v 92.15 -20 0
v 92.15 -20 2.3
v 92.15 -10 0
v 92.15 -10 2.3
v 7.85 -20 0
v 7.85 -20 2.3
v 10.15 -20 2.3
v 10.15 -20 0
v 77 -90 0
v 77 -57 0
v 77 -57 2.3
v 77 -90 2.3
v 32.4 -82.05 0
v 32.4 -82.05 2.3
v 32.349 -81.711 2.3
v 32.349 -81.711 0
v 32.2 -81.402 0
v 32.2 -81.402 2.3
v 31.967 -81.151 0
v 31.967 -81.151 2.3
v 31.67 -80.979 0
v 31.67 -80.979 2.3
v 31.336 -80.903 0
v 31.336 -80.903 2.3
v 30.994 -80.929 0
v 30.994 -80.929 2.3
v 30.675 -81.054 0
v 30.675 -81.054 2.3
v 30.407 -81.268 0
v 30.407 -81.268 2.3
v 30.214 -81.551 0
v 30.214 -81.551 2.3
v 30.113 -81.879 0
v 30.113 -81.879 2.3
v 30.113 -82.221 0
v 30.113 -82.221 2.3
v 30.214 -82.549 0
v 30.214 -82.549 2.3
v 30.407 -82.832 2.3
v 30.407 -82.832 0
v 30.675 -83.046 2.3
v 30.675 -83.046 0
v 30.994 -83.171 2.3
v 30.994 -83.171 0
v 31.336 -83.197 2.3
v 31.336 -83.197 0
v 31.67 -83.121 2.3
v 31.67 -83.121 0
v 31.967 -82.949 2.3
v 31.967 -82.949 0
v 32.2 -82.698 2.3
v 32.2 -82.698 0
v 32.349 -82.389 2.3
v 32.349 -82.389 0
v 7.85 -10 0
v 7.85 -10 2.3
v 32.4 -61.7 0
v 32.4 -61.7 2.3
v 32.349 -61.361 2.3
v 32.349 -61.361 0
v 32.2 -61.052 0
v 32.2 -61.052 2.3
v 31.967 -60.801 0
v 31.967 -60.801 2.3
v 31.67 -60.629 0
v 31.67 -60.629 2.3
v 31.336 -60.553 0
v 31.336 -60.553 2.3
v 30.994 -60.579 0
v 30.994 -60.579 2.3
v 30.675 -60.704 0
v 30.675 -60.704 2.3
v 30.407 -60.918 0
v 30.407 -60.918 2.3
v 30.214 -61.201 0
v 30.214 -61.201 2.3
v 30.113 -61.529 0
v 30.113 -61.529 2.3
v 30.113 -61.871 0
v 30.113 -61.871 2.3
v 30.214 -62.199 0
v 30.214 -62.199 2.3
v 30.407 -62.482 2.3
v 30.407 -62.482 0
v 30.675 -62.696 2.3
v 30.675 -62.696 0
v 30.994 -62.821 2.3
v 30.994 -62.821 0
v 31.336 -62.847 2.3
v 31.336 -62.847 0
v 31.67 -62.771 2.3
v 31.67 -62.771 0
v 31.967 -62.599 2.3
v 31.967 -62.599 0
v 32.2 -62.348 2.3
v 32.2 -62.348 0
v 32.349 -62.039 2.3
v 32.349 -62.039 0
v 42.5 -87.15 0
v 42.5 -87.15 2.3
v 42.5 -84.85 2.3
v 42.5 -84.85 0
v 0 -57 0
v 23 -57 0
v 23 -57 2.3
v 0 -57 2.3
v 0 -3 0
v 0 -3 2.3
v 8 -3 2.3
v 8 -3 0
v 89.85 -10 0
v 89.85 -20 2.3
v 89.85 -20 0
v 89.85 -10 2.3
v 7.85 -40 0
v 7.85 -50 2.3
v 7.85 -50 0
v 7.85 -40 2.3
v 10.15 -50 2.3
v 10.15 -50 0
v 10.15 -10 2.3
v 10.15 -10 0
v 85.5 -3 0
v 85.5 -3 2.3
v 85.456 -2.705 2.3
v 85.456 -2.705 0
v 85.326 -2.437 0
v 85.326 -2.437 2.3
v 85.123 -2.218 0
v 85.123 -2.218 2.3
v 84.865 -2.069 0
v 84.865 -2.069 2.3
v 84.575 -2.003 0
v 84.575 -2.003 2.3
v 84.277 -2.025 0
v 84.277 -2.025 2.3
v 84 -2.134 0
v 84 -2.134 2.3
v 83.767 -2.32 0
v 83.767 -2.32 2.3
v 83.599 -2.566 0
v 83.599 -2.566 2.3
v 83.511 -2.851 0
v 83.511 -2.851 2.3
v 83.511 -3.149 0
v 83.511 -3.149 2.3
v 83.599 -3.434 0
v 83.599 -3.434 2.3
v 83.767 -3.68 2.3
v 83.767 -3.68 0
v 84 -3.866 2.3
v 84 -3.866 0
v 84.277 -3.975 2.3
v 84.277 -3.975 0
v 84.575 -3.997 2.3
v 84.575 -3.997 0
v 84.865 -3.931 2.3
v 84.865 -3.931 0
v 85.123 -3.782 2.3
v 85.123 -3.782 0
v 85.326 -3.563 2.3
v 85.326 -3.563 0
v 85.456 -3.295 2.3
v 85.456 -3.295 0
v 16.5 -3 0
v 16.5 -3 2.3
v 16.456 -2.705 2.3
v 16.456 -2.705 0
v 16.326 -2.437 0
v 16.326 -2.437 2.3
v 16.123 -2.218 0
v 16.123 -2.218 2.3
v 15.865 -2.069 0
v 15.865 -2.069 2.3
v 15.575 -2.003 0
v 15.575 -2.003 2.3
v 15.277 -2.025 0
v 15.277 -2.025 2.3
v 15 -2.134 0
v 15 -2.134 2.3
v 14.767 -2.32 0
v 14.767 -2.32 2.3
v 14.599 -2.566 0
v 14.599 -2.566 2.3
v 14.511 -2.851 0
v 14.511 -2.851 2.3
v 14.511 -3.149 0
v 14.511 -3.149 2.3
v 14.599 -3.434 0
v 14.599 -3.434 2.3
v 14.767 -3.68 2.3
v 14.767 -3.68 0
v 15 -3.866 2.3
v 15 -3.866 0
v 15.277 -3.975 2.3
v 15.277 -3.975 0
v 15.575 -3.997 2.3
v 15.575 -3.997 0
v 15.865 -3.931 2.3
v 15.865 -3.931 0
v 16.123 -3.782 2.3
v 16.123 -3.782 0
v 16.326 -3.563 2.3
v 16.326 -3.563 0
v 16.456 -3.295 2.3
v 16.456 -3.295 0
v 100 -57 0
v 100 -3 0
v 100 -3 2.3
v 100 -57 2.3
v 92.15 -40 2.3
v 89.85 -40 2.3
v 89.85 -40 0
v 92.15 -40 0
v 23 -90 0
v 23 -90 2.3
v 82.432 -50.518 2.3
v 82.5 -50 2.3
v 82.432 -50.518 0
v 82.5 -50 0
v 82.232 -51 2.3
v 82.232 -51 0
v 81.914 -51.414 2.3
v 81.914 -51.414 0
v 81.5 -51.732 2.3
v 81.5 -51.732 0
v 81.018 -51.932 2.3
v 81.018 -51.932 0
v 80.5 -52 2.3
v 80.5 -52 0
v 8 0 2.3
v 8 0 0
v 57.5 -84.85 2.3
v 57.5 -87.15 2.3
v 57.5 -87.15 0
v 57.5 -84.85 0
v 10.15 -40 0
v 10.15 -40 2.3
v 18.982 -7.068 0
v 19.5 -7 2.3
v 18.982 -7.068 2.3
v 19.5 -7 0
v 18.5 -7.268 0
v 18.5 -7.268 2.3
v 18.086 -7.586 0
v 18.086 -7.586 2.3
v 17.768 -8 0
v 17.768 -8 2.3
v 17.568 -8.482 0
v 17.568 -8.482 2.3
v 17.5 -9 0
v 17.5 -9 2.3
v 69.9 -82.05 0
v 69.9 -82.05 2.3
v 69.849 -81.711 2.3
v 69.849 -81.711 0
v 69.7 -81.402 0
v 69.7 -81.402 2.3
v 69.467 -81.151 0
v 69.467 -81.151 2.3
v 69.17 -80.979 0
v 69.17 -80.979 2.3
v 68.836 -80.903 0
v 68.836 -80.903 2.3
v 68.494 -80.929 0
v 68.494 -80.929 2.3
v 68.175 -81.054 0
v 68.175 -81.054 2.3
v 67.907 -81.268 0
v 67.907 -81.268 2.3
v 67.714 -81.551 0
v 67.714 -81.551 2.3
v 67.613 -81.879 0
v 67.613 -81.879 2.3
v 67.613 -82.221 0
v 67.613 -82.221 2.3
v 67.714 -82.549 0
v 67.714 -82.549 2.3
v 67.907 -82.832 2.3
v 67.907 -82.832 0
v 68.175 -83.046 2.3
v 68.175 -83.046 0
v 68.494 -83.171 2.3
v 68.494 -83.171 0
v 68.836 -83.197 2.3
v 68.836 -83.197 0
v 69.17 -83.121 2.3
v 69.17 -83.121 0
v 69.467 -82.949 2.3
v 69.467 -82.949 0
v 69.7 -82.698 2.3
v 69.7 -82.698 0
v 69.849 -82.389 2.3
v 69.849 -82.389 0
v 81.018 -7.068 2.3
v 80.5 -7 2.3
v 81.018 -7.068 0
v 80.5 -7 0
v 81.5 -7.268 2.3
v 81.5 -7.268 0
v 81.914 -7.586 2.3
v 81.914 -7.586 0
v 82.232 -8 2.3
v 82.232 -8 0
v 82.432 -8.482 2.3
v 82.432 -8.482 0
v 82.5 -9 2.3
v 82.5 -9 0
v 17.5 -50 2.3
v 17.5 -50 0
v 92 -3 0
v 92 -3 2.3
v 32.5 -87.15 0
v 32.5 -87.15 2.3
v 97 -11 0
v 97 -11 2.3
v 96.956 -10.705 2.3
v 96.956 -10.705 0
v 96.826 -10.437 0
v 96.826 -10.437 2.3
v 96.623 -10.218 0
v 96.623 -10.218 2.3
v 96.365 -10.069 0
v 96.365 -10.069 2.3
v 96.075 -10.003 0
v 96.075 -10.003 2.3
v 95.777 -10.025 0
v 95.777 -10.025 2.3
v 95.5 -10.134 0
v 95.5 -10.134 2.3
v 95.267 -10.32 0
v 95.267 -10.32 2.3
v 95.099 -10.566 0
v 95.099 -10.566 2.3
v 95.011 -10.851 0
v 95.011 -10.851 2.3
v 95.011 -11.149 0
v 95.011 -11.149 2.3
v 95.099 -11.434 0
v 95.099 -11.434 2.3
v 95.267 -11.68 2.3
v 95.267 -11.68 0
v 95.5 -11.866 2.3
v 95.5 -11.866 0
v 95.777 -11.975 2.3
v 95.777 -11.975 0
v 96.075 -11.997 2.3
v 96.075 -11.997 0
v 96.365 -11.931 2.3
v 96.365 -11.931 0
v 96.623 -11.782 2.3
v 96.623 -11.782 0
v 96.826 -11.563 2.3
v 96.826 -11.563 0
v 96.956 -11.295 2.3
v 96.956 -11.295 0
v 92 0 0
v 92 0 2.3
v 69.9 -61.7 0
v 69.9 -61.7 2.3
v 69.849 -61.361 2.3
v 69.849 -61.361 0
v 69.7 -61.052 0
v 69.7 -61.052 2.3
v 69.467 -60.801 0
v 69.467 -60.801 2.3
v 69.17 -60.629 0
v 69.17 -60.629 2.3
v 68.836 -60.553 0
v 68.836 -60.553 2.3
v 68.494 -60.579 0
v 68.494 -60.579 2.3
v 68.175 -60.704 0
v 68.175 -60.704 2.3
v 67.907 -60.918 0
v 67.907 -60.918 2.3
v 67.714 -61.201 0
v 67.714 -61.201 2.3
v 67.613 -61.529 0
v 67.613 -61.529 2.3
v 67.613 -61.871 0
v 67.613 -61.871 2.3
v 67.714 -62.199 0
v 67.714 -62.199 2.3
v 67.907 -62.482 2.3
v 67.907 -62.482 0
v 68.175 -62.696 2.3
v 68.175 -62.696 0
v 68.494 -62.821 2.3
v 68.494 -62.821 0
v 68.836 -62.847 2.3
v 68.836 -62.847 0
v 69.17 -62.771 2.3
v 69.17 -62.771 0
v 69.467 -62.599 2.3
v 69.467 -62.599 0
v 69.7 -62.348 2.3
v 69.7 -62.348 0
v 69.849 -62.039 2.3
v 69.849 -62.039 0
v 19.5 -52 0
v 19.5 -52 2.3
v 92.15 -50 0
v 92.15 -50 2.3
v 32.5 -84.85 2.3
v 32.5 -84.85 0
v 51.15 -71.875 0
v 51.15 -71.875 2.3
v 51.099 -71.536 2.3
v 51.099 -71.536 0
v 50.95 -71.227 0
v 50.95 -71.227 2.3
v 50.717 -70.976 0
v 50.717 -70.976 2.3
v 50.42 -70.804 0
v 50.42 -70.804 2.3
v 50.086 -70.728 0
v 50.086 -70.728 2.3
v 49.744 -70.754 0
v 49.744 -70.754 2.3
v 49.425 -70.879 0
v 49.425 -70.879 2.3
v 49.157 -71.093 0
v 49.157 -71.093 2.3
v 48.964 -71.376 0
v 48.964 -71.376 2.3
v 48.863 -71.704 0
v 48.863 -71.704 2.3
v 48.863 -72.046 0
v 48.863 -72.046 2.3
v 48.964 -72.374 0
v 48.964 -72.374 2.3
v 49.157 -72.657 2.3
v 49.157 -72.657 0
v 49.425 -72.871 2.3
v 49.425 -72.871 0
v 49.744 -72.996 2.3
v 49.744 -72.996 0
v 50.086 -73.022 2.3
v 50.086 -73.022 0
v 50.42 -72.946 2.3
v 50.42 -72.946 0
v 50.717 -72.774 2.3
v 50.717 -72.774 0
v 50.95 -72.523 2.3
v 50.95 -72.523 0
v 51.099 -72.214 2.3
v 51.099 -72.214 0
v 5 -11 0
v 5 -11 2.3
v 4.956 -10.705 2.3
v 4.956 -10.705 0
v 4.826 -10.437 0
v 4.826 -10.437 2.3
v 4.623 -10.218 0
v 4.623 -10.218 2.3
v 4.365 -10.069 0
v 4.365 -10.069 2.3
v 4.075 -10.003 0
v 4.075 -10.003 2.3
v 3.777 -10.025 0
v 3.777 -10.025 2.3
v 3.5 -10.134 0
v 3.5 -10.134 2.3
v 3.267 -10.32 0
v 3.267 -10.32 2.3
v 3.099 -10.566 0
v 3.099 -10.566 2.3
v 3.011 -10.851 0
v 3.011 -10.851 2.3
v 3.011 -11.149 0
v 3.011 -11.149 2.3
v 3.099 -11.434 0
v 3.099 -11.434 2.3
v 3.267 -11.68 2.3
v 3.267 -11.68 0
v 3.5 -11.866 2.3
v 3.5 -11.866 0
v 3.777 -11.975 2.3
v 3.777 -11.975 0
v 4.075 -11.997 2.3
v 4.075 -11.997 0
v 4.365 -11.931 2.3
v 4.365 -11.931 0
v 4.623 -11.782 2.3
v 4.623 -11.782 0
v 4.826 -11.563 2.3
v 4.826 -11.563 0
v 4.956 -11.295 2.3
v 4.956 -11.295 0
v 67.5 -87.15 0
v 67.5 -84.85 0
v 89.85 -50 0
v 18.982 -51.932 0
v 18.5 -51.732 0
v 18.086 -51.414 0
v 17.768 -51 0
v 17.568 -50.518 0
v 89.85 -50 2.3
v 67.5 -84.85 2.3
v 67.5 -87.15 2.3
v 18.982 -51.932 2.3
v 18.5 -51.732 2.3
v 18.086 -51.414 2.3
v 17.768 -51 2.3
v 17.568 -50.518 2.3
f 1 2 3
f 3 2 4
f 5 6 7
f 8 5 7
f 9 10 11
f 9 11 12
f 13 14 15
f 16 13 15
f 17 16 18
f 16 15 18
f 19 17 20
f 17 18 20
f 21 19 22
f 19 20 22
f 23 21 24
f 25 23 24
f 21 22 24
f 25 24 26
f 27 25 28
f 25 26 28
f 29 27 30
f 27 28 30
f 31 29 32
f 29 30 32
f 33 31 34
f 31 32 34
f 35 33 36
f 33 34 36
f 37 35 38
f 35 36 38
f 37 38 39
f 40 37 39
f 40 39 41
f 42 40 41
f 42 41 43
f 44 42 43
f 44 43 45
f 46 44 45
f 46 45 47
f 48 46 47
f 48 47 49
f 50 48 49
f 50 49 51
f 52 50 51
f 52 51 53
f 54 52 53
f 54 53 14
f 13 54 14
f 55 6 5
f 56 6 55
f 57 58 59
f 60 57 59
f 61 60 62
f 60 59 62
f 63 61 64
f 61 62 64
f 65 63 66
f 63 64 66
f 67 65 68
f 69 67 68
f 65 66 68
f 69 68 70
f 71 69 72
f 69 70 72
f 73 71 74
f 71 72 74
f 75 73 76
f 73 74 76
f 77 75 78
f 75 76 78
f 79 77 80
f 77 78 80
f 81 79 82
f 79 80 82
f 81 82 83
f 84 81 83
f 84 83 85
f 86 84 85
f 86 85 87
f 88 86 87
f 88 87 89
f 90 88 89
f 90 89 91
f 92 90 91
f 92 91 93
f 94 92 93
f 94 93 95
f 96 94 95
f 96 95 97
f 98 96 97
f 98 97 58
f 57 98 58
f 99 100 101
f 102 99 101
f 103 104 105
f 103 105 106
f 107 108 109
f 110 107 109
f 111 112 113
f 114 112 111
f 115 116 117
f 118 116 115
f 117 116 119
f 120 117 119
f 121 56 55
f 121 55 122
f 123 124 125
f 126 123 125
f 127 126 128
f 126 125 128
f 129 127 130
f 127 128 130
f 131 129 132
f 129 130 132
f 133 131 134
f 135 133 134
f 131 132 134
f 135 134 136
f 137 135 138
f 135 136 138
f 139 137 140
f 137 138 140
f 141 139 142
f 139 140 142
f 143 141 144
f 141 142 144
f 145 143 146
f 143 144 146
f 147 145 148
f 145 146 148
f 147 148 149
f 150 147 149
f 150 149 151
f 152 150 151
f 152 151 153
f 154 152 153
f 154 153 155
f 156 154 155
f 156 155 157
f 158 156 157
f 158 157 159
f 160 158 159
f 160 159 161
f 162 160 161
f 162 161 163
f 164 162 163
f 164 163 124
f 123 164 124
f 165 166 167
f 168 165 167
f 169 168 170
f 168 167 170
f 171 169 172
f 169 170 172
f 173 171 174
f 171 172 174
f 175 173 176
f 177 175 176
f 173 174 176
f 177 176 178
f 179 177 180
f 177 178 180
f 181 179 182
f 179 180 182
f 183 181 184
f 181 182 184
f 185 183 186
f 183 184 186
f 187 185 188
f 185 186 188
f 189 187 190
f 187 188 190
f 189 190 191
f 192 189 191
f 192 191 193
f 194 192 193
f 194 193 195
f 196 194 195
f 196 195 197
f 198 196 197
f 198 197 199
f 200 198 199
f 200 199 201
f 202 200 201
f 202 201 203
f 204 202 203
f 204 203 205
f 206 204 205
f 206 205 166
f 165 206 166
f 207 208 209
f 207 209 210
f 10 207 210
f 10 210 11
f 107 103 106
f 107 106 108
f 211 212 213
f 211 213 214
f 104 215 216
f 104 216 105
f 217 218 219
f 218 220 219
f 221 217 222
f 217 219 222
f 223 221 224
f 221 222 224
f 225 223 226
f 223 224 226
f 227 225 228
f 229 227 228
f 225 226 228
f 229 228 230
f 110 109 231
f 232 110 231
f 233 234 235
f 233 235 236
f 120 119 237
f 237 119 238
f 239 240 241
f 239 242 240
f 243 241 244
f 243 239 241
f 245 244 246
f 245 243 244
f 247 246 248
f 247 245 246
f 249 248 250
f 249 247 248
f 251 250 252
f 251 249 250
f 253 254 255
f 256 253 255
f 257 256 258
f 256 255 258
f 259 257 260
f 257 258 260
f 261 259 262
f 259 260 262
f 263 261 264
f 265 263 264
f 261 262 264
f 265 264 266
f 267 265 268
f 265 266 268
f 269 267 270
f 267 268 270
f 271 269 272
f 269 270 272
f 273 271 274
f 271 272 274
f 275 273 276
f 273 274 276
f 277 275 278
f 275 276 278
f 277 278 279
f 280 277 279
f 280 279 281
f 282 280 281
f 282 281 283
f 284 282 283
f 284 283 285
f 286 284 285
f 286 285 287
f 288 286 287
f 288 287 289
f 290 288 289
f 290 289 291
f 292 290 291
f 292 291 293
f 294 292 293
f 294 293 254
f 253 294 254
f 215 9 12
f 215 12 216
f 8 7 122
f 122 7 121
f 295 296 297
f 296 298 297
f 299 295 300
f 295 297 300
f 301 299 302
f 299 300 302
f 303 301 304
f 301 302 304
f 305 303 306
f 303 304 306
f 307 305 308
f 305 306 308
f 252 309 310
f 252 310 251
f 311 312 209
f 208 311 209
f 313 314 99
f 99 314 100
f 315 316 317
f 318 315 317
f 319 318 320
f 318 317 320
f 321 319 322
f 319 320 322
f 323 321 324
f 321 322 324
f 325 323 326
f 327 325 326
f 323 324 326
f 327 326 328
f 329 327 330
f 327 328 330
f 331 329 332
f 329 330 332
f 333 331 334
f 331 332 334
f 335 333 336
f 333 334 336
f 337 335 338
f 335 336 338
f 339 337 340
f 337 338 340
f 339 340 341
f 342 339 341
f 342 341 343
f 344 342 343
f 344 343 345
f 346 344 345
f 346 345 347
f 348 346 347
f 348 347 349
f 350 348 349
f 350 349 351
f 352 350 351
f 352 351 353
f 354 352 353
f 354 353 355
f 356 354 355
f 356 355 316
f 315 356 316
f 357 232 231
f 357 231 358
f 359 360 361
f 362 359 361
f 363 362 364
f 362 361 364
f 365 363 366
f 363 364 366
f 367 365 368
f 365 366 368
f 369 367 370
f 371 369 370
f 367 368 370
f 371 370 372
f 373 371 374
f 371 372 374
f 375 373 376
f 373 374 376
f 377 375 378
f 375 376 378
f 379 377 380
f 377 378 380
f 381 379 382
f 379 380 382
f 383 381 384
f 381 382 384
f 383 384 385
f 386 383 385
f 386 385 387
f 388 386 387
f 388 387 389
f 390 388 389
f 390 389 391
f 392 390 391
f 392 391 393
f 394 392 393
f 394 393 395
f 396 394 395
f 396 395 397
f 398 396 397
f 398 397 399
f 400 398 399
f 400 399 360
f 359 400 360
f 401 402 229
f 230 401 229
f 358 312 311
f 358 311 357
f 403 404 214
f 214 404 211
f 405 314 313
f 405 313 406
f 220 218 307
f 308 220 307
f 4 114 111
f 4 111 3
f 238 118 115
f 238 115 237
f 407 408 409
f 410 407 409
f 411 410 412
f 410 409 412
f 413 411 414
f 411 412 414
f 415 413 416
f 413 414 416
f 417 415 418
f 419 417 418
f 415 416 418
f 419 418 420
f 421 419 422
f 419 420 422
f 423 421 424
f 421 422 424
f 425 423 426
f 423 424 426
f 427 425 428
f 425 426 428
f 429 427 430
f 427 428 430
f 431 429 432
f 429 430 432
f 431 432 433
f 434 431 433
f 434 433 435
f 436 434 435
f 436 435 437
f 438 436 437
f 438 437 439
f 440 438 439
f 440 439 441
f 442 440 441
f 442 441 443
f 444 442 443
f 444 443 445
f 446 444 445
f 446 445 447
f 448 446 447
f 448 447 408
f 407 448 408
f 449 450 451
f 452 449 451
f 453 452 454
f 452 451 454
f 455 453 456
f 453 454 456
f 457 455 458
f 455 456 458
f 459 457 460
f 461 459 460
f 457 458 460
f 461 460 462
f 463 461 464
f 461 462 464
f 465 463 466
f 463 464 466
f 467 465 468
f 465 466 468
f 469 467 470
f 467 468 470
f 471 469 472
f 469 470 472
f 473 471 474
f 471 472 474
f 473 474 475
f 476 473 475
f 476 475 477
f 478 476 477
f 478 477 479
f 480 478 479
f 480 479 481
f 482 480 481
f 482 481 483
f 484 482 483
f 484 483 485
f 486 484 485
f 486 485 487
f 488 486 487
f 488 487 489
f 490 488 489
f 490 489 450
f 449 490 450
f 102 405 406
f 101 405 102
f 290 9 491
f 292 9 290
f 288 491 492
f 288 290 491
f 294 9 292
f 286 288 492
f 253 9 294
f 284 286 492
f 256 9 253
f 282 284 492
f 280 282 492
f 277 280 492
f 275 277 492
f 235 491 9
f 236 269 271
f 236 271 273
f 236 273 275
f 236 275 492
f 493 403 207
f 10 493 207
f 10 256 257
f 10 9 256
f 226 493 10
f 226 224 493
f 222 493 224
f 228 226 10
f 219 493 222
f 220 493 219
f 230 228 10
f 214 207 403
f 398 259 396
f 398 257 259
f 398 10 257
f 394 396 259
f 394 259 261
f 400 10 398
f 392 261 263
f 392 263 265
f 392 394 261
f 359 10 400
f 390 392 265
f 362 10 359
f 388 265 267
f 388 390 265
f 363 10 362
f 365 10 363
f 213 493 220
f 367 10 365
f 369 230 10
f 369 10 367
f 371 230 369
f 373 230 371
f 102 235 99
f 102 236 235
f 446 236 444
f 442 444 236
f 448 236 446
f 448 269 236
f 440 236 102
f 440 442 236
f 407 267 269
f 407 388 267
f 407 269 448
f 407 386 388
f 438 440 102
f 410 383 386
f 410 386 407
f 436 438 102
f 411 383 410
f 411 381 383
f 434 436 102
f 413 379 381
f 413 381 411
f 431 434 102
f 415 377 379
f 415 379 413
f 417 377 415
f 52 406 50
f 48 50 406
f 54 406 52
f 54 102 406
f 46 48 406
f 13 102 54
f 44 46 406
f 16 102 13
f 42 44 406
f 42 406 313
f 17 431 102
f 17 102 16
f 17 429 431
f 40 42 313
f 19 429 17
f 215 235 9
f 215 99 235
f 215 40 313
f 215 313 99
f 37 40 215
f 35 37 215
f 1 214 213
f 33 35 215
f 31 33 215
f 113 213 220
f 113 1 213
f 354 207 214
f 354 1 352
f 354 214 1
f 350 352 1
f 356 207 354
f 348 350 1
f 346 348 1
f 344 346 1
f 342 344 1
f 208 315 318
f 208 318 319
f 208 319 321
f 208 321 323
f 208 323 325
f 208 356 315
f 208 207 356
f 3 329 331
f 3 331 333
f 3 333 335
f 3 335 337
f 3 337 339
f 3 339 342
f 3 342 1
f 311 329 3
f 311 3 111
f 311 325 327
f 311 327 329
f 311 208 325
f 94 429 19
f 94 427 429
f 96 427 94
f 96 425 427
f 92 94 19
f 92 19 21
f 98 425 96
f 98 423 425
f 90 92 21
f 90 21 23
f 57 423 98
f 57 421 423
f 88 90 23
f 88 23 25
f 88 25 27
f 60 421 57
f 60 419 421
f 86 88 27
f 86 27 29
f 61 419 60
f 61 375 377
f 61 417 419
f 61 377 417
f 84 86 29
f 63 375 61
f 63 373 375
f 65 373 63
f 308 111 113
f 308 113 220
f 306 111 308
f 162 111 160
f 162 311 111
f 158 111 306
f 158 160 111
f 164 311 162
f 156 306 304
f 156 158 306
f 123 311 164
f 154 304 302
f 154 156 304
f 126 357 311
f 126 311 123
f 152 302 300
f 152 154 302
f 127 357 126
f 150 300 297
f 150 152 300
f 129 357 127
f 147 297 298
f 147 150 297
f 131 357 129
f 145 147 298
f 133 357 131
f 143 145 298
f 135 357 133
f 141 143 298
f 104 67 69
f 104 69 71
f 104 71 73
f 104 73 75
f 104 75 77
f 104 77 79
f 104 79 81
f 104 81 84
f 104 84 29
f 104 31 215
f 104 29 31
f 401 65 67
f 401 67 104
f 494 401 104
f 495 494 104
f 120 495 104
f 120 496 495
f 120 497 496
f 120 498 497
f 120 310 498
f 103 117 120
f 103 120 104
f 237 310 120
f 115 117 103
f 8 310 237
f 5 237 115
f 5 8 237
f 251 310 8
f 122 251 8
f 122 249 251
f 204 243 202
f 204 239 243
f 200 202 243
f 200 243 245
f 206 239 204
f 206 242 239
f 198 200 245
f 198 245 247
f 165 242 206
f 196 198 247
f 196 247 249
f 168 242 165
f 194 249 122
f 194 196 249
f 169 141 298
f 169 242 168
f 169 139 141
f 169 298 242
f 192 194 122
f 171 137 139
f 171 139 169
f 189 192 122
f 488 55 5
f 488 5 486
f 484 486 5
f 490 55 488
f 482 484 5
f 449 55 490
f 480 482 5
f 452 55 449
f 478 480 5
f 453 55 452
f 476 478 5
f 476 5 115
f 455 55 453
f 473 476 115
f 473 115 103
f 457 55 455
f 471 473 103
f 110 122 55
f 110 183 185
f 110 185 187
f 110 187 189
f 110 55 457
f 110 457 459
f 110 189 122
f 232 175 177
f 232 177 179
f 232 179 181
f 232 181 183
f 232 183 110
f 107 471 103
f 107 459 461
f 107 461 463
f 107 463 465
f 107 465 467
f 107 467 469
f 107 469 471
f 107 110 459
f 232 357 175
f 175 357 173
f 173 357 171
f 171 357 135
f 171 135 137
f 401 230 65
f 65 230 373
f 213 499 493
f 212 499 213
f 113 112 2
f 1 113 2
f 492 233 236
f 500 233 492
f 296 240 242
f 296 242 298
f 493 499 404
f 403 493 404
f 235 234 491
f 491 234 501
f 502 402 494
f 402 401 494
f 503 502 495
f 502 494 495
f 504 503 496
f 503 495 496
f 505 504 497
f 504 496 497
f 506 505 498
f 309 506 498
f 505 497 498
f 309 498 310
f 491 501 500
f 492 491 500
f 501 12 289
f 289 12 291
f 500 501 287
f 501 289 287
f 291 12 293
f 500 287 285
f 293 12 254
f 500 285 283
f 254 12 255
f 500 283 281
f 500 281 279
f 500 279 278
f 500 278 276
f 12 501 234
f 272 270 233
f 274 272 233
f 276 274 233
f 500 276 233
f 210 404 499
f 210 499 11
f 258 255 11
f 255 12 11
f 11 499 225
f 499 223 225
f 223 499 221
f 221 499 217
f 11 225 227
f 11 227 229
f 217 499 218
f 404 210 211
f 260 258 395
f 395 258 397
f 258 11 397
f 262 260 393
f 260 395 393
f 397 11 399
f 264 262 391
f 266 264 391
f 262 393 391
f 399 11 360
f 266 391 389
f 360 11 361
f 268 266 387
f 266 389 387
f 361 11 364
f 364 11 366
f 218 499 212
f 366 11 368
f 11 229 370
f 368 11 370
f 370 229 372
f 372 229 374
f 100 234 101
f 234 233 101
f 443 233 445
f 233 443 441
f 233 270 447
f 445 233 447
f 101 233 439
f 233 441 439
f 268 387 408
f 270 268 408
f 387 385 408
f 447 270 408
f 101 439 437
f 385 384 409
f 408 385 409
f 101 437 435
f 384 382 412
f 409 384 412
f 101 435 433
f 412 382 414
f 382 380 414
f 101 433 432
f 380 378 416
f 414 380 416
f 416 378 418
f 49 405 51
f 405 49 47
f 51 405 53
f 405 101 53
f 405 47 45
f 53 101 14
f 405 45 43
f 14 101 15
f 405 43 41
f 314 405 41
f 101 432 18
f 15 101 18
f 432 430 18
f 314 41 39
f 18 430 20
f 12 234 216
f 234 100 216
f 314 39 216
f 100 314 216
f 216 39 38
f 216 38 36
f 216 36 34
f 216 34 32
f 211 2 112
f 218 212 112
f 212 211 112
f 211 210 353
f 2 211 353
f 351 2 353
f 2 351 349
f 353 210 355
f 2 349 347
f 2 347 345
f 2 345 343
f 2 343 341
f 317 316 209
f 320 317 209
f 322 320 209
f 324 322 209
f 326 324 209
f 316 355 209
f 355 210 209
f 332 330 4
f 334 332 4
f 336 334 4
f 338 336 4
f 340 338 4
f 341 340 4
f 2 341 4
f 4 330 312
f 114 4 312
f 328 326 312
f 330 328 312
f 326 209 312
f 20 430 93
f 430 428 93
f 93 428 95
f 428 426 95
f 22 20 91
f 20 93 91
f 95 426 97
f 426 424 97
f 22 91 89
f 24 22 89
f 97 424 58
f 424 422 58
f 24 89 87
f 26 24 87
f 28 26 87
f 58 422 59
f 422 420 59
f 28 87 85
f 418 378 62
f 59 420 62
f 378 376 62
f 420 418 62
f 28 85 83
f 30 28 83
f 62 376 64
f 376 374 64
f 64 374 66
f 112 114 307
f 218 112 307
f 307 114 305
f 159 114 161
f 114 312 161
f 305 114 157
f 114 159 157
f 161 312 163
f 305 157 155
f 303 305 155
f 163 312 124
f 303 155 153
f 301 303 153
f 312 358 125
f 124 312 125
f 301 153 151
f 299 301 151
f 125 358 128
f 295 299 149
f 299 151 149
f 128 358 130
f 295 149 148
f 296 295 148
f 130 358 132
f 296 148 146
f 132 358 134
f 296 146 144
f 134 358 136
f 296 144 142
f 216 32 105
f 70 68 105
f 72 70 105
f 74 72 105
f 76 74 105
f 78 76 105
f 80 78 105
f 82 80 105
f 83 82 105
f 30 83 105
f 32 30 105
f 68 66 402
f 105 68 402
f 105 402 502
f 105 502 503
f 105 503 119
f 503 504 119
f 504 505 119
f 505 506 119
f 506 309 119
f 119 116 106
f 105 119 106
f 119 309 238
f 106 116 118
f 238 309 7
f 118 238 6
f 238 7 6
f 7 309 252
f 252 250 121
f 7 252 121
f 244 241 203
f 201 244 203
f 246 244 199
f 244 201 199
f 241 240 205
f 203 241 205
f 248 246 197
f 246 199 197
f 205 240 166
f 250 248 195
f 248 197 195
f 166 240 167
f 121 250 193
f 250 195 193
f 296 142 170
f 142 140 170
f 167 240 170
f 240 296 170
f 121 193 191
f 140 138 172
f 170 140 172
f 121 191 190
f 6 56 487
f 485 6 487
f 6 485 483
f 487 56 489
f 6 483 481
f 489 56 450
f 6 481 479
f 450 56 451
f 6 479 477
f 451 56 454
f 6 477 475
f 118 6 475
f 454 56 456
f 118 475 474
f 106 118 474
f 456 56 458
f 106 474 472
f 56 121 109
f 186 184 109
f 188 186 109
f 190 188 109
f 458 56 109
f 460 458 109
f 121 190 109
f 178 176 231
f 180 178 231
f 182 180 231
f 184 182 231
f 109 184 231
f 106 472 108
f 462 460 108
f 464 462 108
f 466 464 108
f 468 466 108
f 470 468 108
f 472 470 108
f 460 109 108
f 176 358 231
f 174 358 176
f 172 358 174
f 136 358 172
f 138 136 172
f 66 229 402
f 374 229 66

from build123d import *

# Parameters (mm, degrees)
BOSS_EXTRUDE1_DEPTH = 2.3
SKETCH5_W           = 65
SKETCH5_H           = 45
CUT_EXTRUDE1_DEPTH  = 3.3
FILLET1_R           = 2
SKETCH7_W           = 2.3
SKETCH7_H           = 10
SKETCH7_W_2         = 10
SKETCH7_H_2         = 2.3
CUT_EXTRUDE2_DEPTH  = 3.3
SKETCH8_R           = 1
CUT_EXTRUDE3_DEPTH  = 3.3
SKETCH10_R          = 1.15
CUT_EXTRUDE4_DEPTH  = 3.3
SKETCH11_W          = 8
SKETCH11_H          = 3
CUT_EXTRUDE5_DEPTH  = 10
SKETCH12_R          = 1
CUT_EXTRUDE6_DEPTH  = 10


with BuildPart() as part:
    # Sketch1 → Boss-Extrude1 (new body)
    with BuildSketch(Plane.XY):
        Polygon((0, 0), (100, 0), (100, -57), (77, -57), (77, -90), (23, -90), (23, -57), (0, -57), align=None)
    extrude(amount=BOSS_EXTRUDE1_DEPTH)

    # Sketch5 → Cut-Extrude1 (cut, through all)
    with BuildSketch(Plane.XY.offset(2.3)):
        with Locations((50, -29.5)):
            Rectangle(SKETCH5_W, SKETCH5_H)
    extrude(amount=-CUT_EXTRUDE1_DEPTH, mode=Mode.SUBTRACT)

    # Fillet1
    fillet1_edges = [part.edges().sort_by_distance(p)[0] for p in [
        (82.5, -7, 1.15),
        (82.5, -52, 1.15),
        (17.5, -52, 1.15),
        (17.5, -7, 1.15),
    ]]
    fillet(fillet1_edges, radius=FILLET1_R)

    # Sketch7 → Cut-Extrude2 (cut, through all)
    with BuildSketch(Plane.XY.offset(2.3)):
        with Locations((91, -15)):
            Rectangle(SKETCH7_W, SKETCH7_H)
        with Locations((91, -45)):
            Rectangle(SKETCH7_W, SKETCH7_H)
        with Locations((9, -15)):
            Rectangle(SKETCH7_W, SKETCH7_H)
        with Locations((9, -45)):
            Rectangle(SKETCH7_W, SKETCH7_H)
        with Locations((37.5, -86)):
            Rectangle(SKETCH7_W_2, SKETCH7_H_2)
        with Locations((62.5, -86)):
            Rectangle(SKETCH7_W_2, SKETCH7_H_2)
    extrude(amount=-CUT_EXTRUDE2_DEPTH, mode=Mode.SUBTRACT)

    # Sketch8 → Cut-Extrude3 (cut, through all)
    with BuildSketch(Plane.XY.offset(2.3)):
        with Locations((15.5, -3)):
            Circle(SKETCH8_R)
        with Locations((84.5, -3)):
            Circle(SKETCH8_R)
    extrude(amount=-CUT_EXTRUDE3_DEPTH, mode=Mode.SUBTRACT)

    # Sketch10 → Cut-Extrude4 (cut, through all)
    with BuildSketch(Plane.XY.offset(2.3)):
        with Locations((49.9996888, -71.875)):
            Circle(SKETCH10_R)
        with Locations((31.2496888, -61.7)):
            Circle(SKETCH10_R)
        with Locations((68.7496888, -61.7)):
            Circle(SKETCH10_R)
        with Locations((31.2496888, -82.05)):
            Circle(SKETCH10_R)
        with Locations((68.7496888, -82.05)):
            Circle(SKETCH10_R)
    extrude(amount=-CUT_EXTRUDE4_DEPTH, mode=Mode.SUBTRACT)

    # Sketch11 → Cut-Extrude5 (cut)
    with BuildSketch(Plane.XY.offset(2.3)):
        with Locations((4, -1.5)):
            Rectangle(SKETCH11_W, SKETCH11_H)
        with Locations((96, -1.5)):
            Rectangle(SKETCH11_W, SKETCH11_H)
    extrude(amount=-CUT_EXTRUDE5_DEPTH, mode=Mode.SUBTRACT)

    # Sketch12 → Cut-Extrude6 (cut)
    with BuildSketch(Plane.XY.offset(2.3)):
        with Locations((4, -11)):
            Circle(SKETCH12_R)
        with Locations((96, -11)):
            Circle(SKETCH12_R)
    extrude(amount=-CUT_EXTRUDE6_DEPTH, mode=Mode.SUBTRACT)


solid = part.part
